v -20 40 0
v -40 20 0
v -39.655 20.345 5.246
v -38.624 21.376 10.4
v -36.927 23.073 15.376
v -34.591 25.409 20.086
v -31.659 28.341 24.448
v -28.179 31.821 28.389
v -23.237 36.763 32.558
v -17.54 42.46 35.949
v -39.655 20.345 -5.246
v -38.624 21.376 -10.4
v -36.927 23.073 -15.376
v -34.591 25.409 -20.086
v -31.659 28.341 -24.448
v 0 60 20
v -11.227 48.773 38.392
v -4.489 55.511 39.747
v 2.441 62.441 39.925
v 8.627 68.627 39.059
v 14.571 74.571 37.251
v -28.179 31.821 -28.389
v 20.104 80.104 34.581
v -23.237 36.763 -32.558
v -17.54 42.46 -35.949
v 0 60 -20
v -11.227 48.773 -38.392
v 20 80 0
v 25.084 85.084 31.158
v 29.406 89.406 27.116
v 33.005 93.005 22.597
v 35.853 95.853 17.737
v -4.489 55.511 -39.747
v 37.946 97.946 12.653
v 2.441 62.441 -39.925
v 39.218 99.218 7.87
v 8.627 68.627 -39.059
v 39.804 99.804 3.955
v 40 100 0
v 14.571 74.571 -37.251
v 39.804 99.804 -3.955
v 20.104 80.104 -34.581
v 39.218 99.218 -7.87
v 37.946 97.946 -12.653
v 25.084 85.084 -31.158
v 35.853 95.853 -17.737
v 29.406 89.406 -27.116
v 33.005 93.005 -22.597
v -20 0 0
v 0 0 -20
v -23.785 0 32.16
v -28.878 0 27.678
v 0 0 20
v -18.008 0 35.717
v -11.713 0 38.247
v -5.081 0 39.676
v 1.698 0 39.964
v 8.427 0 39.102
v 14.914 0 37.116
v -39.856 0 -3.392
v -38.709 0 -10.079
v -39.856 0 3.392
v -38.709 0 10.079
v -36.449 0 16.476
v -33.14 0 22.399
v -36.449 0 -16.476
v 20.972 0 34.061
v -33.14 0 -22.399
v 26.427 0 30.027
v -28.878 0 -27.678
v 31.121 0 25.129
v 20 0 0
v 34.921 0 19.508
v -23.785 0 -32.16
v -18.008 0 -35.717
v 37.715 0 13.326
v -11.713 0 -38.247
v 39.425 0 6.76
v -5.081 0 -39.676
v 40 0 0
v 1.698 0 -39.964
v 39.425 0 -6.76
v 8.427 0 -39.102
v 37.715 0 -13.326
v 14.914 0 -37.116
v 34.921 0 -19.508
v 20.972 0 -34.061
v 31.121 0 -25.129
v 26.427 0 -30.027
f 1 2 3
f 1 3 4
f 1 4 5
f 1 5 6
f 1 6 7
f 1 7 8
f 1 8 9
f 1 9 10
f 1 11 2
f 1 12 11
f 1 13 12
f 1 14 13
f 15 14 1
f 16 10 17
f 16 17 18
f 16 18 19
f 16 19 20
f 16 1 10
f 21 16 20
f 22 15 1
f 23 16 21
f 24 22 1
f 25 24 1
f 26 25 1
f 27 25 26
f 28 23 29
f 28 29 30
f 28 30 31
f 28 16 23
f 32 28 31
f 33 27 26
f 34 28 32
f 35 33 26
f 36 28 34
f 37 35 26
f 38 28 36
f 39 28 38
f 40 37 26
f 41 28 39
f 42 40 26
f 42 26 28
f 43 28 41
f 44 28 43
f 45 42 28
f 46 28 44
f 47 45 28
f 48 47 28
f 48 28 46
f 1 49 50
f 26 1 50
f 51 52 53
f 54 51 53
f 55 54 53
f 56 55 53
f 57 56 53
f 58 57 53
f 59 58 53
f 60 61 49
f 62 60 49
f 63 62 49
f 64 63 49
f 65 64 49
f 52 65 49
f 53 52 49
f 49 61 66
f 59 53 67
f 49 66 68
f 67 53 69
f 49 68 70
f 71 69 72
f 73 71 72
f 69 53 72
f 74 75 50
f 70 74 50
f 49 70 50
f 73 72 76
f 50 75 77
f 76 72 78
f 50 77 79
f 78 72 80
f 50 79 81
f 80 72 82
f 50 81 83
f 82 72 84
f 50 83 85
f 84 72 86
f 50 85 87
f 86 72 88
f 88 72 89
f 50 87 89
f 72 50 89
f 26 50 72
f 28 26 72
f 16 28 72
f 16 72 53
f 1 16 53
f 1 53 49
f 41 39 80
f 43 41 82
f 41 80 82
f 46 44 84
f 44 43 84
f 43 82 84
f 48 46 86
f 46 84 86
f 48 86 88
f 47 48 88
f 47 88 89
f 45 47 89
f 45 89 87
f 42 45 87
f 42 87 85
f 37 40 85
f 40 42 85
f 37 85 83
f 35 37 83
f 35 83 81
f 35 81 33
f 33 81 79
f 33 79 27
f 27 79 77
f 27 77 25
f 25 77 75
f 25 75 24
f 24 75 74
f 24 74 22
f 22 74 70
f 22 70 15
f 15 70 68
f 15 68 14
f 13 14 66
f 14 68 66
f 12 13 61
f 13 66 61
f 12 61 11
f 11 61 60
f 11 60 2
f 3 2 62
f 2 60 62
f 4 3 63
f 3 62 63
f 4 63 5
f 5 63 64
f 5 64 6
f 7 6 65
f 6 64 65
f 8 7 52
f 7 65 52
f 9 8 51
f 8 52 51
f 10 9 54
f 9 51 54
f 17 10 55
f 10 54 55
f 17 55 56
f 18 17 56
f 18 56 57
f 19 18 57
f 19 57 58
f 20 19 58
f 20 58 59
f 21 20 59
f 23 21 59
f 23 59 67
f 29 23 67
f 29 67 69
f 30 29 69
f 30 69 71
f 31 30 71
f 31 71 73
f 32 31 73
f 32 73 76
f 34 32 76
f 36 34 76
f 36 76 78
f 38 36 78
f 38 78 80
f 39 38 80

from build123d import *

# Parameters (mm, degrees)
SKETCH1_R               = 40
BOSS_EXTRUDE1_DEPTH     = 100
CUT_EXTRUDE1_DEPTH      = 41
CUT_EXTRUDE1_DEPTH_BACK = 41


with BuildPart() as part:
    # Sketch1 → Boss-Extrude1 (new body)
    with BuildSketch(Plane(origin=(0, 0, 0), x_dir=(1, 0, 0), z_dir=(0, 1, 0))):
        Circle(SKETCH1_R)
        Polygon((0, -20), (-20, 0), (0, 20), (20, 0), align=None, mode=Mode.SUBTRACT)
    extrude(amount=BOSS_EXTRUDE1_DEPTH)

    # Sketch2 → Cut-Extrude1 (cut, two sides)
    with BuildSketch(Plane.XY) as cut_extrude1_sk:
        Polygon((-40, 20), (40, 100), (-40, 100), align=None)
    extrude(amount=CUT_EXTRUDE1_DEPTH, mode=Mode.SUBTRACT)
    extrude(cut_extrude1_sk.sketch, amount=-CUT_EXTRUDE1_DEPTH_BACK, mode=Mode.SUBTRACT)


solid = part.part
